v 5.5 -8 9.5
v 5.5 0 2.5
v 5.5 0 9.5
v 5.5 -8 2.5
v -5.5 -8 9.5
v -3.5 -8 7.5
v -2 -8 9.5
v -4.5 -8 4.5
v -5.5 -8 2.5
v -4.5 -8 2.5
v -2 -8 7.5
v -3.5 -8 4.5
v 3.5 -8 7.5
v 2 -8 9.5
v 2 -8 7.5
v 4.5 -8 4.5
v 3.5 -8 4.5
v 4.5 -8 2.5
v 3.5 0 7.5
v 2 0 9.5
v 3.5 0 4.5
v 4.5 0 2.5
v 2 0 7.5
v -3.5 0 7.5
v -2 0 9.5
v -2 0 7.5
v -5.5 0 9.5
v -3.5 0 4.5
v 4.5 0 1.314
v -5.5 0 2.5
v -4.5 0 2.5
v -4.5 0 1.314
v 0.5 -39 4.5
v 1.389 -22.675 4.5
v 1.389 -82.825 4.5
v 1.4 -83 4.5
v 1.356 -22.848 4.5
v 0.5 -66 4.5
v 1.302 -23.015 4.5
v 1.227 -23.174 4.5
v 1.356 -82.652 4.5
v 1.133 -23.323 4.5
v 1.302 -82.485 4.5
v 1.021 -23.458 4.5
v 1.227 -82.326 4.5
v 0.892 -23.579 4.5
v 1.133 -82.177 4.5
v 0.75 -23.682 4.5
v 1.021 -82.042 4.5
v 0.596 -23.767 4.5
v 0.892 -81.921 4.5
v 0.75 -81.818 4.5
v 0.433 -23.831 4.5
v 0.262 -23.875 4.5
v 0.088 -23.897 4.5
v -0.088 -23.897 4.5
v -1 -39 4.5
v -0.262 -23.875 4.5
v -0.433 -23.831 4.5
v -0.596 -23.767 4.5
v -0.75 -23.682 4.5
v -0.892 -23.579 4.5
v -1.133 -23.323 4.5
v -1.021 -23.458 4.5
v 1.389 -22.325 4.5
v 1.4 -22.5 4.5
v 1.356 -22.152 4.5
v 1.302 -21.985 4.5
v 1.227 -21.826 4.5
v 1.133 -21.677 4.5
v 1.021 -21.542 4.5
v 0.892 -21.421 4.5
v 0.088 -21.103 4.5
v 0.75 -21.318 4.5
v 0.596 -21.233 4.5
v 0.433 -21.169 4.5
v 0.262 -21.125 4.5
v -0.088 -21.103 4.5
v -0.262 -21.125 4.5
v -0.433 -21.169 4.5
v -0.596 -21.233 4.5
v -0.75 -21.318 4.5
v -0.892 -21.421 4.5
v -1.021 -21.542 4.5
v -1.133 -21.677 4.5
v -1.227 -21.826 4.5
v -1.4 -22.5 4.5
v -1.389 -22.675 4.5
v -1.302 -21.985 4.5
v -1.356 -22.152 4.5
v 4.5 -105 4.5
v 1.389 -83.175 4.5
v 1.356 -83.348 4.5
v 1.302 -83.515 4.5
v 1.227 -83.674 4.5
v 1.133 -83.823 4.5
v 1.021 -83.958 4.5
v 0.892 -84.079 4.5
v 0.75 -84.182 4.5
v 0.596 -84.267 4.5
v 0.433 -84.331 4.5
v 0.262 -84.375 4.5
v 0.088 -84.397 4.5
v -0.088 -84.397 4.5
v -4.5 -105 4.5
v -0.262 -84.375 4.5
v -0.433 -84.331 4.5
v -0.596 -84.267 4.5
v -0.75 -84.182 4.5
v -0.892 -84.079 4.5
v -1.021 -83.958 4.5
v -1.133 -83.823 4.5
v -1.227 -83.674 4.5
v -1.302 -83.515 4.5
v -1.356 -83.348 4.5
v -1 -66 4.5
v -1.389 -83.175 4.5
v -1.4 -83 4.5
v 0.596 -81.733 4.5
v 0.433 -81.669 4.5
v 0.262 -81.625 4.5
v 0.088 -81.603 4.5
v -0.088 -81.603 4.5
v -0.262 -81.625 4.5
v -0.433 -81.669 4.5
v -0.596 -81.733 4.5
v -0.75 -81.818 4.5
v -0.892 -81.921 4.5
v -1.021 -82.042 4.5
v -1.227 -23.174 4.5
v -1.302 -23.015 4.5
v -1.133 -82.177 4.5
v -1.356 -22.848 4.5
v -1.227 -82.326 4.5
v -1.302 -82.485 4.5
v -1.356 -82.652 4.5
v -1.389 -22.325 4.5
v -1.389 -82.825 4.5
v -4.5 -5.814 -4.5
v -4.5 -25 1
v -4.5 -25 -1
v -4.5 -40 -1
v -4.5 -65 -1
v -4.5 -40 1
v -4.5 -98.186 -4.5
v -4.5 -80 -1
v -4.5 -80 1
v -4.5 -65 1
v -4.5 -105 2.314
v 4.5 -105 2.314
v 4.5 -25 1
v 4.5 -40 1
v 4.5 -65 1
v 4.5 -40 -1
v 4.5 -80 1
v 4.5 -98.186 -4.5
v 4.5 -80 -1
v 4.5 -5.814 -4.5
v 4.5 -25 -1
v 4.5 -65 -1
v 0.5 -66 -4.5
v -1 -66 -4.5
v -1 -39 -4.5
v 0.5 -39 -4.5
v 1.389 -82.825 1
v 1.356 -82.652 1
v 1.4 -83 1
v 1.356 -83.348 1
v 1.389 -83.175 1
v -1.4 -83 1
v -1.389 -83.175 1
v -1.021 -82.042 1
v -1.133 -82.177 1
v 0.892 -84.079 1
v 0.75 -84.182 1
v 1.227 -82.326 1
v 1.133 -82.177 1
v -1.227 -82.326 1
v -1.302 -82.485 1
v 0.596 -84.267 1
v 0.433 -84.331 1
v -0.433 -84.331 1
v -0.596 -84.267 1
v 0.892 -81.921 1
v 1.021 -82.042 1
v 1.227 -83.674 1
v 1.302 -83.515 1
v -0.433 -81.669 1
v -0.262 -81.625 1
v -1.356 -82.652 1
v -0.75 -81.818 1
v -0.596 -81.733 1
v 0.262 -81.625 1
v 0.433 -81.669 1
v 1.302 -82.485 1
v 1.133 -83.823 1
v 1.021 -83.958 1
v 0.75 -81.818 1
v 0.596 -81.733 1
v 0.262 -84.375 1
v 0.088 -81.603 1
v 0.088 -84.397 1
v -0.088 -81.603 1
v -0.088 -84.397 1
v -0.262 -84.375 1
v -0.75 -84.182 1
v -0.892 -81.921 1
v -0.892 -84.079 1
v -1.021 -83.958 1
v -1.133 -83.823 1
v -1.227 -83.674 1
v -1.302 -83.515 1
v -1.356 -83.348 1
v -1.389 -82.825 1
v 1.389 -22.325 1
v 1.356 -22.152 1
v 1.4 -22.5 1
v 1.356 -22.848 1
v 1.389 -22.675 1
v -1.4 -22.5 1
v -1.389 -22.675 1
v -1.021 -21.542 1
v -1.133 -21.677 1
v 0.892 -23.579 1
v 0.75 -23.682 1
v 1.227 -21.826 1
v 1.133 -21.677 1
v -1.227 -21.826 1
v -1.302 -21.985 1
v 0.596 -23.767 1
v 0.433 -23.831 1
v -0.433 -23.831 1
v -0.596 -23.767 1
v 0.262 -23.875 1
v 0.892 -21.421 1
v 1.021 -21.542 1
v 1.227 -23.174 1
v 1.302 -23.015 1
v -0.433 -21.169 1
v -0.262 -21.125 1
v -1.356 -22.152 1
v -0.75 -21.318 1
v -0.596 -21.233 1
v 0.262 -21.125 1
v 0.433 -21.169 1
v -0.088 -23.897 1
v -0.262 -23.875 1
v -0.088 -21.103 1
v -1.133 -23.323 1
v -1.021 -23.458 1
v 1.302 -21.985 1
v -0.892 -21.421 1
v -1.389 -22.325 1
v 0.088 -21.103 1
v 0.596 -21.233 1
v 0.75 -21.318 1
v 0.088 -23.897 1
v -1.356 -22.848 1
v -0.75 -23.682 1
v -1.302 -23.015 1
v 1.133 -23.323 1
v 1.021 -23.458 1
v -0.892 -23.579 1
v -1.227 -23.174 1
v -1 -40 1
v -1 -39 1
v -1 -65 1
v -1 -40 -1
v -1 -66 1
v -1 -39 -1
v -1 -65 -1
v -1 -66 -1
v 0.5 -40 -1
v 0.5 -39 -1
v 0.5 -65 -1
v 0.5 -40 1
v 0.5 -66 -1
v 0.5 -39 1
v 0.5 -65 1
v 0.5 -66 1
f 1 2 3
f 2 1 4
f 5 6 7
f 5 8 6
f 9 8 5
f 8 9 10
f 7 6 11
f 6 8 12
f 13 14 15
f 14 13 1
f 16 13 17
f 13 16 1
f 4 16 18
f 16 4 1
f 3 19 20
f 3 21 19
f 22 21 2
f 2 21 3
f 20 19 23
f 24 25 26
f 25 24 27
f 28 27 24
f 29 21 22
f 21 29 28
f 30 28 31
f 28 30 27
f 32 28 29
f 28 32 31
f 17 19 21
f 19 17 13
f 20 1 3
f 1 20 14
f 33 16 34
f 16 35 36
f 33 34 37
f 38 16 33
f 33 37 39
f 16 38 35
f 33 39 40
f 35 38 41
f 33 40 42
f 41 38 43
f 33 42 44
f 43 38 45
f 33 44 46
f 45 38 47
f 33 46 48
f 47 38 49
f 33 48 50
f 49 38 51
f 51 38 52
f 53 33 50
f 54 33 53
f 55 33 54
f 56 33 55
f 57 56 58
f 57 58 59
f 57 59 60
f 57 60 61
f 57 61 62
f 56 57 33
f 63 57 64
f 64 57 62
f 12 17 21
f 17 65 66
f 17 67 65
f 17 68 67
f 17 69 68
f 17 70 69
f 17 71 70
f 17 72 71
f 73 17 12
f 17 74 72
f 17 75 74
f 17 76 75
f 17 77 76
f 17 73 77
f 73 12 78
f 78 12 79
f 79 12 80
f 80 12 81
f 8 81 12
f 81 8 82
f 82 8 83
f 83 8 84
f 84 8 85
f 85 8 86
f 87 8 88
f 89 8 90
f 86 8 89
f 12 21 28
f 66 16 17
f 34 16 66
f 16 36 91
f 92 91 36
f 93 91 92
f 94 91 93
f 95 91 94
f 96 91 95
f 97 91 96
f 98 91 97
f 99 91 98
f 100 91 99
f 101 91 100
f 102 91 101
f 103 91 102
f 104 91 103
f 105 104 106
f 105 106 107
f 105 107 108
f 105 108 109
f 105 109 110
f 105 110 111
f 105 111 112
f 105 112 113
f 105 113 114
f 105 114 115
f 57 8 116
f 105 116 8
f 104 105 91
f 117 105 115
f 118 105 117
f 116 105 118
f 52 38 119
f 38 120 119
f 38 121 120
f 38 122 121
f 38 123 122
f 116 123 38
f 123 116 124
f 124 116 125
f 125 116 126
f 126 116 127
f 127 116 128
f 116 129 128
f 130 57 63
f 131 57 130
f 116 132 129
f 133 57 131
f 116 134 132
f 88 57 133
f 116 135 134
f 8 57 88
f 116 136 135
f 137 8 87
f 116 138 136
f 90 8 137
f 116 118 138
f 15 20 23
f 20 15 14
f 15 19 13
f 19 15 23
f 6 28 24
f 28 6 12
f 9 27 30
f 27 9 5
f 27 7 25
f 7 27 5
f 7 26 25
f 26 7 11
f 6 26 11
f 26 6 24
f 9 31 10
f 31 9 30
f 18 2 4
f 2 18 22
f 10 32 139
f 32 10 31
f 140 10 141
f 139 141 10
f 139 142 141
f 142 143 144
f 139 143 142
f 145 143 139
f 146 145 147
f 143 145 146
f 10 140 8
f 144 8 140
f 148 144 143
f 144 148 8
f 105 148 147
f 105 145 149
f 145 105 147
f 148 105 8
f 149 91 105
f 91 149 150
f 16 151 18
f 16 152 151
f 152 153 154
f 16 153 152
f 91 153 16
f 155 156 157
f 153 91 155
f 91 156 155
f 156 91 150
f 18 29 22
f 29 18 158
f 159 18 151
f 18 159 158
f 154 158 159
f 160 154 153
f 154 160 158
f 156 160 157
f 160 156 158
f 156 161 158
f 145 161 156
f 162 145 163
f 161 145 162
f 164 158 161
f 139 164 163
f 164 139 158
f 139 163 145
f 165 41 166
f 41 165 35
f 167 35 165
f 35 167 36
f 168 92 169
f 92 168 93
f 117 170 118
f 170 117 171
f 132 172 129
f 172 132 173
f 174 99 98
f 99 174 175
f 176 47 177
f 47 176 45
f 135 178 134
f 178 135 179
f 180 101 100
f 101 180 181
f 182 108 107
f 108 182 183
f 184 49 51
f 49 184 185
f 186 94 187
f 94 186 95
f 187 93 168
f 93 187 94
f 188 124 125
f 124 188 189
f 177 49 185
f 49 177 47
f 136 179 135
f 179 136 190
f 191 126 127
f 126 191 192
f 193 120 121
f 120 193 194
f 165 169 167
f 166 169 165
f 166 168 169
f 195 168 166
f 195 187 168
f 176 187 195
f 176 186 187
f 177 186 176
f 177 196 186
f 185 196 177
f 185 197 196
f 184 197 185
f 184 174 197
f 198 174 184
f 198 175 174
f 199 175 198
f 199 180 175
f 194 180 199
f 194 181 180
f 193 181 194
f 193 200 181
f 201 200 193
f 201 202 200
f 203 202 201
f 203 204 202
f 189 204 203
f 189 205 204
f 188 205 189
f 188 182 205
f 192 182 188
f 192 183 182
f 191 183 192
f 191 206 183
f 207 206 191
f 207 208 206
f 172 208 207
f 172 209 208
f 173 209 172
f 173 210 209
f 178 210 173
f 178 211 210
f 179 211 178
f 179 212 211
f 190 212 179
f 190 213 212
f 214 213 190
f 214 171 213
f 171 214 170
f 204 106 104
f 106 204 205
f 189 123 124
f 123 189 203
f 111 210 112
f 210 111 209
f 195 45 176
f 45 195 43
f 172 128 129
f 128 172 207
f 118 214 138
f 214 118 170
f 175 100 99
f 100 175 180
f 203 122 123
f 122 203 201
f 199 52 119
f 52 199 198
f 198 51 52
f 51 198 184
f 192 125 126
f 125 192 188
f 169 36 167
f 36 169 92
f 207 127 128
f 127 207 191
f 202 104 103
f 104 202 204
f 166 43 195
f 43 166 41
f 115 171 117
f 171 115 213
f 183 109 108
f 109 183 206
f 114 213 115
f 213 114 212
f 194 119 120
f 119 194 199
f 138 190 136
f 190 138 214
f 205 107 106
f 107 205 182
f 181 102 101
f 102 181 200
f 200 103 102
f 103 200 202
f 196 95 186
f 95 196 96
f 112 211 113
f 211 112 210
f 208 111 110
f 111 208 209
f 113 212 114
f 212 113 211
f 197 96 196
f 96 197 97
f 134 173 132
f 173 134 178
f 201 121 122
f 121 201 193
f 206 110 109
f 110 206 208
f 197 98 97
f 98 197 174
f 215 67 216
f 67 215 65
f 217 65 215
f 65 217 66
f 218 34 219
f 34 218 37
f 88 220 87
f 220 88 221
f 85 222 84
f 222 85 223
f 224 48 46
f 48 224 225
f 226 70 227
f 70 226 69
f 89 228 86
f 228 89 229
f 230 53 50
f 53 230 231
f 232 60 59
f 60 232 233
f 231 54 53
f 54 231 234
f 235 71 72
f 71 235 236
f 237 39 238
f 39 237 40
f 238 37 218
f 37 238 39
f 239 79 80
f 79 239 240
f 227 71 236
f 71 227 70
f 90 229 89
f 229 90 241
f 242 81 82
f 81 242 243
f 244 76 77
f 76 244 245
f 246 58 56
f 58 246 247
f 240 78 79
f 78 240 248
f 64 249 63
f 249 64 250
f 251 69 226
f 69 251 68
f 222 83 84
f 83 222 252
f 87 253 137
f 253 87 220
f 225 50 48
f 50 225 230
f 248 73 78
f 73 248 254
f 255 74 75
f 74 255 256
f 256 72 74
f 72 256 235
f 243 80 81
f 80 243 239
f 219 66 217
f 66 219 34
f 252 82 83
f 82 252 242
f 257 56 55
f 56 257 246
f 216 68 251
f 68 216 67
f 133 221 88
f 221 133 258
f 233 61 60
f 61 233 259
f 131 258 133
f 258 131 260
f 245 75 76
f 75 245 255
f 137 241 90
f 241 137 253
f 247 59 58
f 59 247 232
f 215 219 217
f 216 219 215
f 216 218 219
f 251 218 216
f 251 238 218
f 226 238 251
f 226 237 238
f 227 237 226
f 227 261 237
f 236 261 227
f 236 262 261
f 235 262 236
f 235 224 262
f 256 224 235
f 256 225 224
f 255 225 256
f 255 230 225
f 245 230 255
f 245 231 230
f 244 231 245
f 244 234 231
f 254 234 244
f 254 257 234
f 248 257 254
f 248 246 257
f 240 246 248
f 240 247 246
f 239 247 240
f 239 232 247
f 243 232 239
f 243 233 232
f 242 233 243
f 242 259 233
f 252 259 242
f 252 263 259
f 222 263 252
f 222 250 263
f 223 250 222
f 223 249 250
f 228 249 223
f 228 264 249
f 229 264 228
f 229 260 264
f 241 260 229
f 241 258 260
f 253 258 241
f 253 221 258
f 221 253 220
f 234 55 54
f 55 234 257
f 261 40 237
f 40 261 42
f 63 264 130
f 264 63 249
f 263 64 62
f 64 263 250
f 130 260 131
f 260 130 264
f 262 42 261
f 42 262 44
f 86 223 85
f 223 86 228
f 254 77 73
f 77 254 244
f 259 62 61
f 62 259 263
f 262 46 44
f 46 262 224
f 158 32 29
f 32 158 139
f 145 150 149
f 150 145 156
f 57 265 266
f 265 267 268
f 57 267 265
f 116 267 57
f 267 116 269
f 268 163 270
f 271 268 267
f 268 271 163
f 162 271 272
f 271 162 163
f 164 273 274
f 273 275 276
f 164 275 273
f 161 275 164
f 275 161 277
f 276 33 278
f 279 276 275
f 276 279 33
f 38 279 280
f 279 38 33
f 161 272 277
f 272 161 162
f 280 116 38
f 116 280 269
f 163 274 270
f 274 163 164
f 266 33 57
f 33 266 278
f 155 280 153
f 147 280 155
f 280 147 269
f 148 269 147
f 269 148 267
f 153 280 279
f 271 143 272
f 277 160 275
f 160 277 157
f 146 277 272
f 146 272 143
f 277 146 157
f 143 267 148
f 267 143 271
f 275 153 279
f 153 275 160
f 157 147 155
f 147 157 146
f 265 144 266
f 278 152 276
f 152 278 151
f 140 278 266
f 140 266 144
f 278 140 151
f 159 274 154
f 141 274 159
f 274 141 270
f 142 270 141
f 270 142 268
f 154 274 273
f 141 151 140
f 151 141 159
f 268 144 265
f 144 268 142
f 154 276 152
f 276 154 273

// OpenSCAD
$fn=50;

CORNER_RADIUS = 1.0; // Radius of corners
WALL = 1.0;// Wall Thickness

KEEL_W=9.0;
KEEL_H=9.0;
KEEL_L=105;

VENT_OFFSET = 2.5;
VENT_L = 16.5;
VENT_R = -18.5;
 
difference() {
    union() {
        // keel
        rotate([90,0,0])
        linear_extrude(KEEL_L) square([KEEL_W, KEEL_H], center=true); 
            
        // Inverted L-shaped C-clamp
        translate([0, 0, 4.5])
        rotate([90, 0, 0])
        union() {
            // Vertical arm of the C-clamp 2
            //(x, y, z)
            translate([3.5, 0, 0]) cube([2, 5, 8]);
            // Horizontal arm of the C-clamp
            rotate([90, 0, 0]) translate([2, 0, -5]) cube([2, 8, 2]);
            
            // Vertical arm of the C-clamp 1
            translate([-5.5, 0, 0]) cube([2, 5, 8]);
            // Horizontal arm of the C-clamp
            rotate([90, 0, 0]) translate([-4, 0,-5]) cube([2, 8, 2]);
            
            // clamp bed
            rotate([90, 0, 0]) translate([-5.5, 0,-0]) cube([11, 8, 2]);
        }
    }
    
    // back of keel slope
    //(x, y, z)
    translate([-5, -1, -11])
    rotate([45, 0, 0])
    cube([10, 11, 8]);  
    
    // front of keel slope
    translate([-5, -KEEL_L-6, -3])
    rotate([-45, 0, 0])
    cube([10, 11, 8]); 
    
    //center cutout - vent
    // x, y, z
    translate([-1.0, -39, -6])
    rotate([90,0,0])
    //y, z, x
    cube([1.5, 12, 27]);
    
    // screw holes
    rotate([0,0,0])
    union() {
        // (x,y,z)
        //translate([0.0, KEEL_LENGTH-35.0, -4.6]) #cylinder(h=4, d=2.8); 
        translate([0.0, -83, 1]) cylinder(h=4, d=2.8); 
        translate([0.0, -22.5, 1]) cylinder(h=4, d=2.8);   
    }
    
    // thru slots for straps
    rotate([0, 0, 0])
    translate([-7.0, -80,-1]) cube([14, 15, 2]);
    rotate([0, 0, 0])
    translate([-7.0, -40,-1]) cube([14, 15, 2]);
}
